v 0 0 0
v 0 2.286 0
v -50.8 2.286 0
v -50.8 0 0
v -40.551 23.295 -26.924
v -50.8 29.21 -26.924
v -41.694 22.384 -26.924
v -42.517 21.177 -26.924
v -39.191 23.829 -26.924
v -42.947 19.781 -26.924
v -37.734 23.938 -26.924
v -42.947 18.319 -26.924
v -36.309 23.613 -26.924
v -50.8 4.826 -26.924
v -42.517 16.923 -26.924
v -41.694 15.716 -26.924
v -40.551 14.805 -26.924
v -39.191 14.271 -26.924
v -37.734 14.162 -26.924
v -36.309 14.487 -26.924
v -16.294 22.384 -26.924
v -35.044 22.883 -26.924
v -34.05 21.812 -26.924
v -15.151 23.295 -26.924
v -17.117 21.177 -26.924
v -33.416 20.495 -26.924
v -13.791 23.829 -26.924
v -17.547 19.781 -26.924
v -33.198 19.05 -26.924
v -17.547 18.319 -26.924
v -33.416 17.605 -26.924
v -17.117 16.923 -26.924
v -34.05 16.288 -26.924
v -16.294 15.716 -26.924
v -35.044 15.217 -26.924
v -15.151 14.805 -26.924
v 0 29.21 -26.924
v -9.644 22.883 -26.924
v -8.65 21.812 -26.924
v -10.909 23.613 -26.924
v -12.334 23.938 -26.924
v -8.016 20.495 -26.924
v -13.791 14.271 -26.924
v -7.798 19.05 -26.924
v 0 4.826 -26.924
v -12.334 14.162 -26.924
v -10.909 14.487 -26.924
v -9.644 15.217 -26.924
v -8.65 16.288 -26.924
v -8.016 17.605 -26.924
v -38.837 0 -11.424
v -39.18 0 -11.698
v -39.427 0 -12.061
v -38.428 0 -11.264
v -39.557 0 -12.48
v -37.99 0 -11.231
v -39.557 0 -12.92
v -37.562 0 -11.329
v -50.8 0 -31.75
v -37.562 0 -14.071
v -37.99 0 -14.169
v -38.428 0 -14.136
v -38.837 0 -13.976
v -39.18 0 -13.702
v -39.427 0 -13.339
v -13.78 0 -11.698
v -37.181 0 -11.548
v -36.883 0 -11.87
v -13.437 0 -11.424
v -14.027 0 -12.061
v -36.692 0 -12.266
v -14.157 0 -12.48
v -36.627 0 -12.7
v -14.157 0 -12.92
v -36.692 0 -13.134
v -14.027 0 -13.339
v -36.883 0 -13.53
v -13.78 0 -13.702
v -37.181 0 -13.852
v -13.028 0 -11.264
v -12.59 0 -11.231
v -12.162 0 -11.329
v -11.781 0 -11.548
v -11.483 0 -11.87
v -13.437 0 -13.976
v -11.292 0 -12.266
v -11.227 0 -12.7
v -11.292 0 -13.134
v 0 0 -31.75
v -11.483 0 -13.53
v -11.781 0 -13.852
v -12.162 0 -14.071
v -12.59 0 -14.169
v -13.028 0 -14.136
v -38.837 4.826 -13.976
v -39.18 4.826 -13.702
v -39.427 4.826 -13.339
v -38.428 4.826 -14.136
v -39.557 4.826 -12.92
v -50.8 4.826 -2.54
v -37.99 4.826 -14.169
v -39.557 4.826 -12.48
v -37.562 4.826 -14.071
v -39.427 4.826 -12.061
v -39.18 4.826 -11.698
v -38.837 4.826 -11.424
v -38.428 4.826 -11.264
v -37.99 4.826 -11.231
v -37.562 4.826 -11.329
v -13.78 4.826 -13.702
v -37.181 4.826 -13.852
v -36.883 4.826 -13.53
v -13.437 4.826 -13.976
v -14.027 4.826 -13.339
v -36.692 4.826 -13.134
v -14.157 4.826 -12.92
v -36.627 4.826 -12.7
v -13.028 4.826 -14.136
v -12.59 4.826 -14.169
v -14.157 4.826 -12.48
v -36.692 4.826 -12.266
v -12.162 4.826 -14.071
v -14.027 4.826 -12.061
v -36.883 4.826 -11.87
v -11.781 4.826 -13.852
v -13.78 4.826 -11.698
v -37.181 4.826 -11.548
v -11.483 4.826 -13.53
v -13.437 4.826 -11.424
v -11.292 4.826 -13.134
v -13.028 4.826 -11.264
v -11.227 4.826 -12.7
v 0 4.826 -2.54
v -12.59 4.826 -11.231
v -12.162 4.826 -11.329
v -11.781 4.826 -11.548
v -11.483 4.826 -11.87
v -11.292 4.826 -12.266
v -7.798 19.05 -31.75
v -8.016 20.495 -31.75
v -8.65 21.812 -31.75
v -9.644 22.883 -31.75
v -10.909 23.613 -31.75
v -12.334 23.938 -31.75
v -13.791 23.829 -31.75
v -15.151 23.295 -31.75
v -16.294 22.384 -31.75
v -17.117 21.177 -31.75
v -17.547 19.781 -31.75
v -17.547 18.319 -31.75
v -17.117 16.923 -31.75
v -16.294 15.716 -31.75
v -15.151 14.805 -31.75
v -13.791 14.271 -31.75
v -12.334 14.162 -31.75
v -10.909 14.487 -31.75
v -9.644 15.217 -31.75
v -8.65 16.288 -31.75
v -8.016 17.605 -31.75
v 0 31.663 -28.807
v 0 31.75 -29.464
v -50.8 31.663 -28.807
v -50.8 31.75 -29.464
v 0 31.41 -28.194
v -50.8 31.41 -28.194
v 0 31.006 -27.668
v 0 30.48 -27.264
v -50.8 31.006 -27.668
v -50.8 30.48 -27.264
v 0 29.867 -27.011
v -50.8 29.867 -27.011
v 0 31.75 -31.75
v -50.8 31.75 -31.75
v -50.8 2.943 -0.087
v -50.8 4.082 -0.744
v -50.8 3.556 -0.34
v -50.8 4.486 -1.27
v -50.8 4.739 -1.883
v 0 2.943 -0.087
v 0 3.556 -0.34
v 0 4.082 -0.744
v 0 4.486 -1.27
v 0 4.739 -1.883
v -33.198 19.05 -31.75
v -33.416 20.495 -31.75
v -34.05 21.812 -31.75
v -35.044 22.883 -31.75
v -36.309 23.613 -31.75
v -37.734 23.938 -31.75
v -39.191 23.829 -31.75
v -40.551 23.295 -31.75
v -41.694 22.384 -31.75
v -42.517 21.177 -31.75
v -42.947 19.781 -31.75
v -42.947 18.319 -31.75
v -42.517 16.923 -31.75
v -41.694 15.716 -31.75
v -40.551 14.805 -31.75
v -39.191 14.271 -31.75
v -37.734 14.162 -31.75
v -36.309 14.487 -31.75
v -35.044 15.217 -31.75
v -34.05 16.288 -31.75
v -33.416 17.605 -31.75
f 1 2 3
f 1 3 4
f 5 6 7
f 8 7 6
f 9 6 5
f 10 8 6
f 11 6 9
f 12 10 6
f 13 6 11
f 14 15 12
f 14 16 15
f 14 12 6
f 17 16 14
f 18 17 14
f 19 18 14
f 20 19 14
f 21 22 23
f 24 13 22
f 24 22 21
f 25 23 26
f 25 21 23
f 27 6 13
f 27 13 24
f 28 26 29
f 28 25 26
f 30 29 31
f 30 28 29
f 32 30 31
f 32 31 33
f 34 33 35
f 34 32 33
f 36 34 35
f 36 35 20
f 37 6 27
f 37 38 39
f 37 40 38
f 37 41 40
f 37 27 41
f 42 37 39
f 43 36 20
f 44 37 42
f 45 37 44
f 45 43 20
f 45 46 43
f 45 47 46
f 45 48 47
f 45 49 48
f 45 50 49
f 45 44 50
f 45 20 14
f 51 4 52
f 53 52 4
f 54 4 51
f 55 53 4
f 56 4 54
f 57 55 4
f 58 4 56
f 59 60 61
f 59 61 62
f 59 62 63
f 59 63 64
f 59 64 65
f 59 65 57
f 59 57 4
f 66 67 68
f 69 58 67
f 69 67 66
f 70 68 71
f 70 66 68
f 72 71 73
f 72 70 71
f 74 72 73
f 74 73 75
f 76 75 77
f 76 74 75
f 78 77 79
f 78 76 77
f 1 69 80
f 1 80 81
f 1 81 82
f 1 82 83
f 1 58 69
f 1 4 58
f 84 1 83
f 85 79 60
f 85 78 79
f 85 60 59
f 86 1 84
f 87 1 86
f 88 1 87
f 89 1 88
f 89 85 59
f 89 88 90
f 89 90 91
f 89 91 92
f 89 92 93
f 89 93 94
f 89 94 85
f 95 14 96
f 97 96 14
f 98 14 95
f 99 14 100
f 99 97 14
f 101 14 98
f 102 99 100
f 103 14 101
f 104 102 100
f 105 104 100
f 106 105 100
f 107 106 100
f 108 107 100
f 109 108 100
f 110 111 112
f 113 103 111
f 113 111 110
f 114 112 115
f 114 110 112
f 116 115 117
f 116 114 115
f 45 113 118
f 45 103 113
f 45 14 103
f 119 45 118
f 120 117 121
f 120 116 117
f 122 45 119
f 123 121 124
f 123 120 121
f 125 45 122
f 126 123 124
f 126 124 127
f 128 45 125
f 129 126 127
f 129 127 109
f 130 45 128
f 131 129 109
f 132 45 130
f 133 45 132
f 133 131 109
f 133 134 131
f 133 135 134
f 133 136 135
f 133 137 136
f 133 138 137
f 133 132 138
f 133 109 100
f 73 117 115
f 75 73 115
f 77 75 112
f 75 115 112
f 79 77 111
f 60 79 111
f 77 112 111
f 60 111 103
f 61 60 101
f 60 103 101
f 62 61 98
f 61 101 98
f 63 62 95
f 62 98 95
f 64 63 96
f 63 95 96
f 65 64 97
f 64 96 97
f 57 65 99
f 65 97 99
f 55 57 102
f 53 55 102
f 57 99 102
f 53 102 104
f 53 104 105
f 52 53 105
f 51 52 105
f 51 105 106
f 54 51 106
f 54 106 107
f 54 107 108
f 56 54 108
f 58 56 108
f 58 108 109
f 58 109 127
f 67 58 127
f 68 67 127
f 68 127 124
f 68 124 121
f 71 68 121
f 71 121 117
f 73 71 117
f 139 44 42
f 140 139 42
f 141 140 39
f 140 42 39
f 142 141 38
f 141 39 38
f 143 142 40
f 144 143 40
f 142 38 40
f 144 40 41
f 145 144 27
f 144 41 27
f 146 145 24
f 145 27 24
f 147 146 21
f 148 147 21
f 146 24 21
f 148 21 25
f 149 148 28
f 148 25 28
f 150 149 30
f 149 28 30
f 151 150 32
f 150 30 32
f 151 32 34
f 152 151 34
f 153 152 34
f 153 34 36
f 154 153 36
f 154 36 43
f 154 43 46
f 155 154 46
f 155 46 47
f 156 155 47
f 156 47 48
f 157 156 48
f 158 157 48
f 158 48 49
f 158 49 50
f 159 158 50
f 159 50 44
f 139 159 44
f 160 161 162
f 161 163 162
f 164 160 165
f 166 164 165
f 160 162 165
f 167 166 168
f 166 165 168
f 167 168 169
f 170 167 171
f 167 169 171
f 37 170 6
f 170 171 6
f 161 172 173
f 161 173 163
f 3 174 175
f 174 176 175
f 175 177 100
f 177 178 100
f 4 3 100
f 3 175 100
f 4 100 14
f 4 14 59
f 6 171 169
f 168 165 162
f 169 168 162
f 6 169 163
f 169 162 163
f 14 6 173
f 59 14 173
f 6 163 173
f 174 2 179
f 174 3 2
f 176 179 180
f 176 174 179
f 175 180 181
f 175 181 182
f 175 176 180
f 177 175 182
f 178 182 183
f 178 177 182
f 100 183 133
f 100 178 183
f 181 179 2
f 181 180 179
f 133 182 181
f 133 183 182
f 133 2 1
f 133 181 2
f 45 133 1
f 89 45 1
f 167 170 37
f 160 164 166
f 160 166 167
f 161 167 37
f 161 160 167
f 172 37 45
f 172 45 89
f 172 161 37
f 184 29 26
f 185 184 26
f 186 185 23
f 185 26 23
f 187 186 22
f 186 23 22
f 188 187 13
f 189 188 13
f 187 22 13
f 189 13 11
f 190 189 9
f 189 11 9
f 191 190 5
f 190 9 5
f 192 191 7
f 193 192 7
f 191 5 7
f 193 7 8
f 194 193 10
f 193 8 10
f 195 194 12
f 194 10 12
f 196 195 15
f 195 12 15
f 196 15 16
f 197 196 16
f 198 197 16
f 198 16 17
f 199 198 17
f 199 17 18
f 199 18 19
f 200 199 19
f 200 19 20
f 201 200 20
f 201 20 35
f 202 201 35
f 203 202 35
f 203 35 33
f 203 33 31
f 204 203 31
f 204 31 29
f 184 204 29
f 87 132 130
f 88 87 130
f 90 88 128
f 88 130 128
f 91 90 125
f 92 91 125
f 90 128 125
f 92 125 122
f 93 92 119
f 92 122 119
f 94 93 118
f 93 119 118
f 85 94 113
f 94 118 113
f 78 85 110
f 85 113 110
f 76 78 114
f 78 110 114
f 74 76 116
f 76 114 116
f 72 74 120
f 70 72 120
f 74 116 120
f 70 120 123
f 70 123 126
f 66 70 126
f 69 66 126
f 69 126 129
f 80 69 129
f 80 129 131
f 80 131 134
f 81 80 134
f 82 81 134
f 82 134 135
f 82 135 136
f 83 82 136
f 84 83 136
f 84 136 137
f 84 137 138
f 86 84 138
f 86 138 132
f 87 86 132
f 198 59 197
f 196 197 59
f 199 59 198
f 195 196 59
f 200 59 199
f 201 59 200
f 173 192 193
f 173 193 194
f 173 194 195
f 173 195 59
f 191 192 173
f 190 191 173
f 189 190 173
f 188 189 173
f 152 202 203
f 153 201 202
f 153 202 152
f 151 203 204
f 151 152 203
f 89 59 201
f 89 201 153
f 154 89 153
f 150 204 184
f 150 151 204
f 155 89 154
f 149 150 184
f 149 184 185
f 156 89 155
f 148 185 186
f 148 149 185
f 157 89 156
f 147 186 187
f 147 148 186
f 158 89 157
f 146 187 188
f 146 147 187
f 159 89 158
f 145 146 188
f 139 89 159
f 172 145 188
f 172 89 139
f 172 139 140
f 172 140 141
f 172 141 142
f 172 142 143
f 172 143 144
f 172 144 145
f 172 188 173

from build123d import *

# Parameters (mm, degrees)
BOSS_EXTRUDE1_DEPTH = 50.8
SKETCH3_R           = 4.9022
CUT_EXTRUDE1_DEPTH  = 50.8
SKETCH4_R           = 1.4732
CUT_EXTRUDE2_DEPTH  = 50.8
FILLET1_R           = 2.54


with BuildPart() as part:
    # Sketch2 → Boss-Extrude1 (new body)
    with BuildSketch(Plane(origin=(0, 0, 0), x_dir=(0, 0, -1), z_dir=(1, 0, 0))):
        Polygon((0, 0), (31.75, 0), (31.75, 31.75), (26.924, 31.75), (26.924, 4.826), (0, 4.826), align=None)
    extrude(amount=-BOSS_EXTRUDE1_DEPTH)

    # Sketch3 → Cut-Extrude1 (cut)
    with BuildSketch(Plane.XY.offset(-26.924)):
        with Locations((-38.1, 19.05)):
            Circle(SKETCH3_R)
        with Locations((-12.7, 19.05)):
            Circle(SKETCH3_R)
    extrude(amount=-CUT_EXTRUDE1_DEPTH, mode=Mode.SUBTRACT)

    # Sketch4 → Cut-Extrude2 (cut)
    with BuildSketch(Plane(origin=(0, 4.826, 0), x_dir=(1, 0, 0), z_dir=(0, 1, 0))):
        with Locations((-38.1, 12.7)):
            Circle(SKETCH4_R)
        with Locations((-12.7, 12.7)):
            Circle(SKETCH4_R)
    extrude(amount=-CUT_EXTRUDE2_DEPTH, mode=Mode.SUBTRACT)

    # Fillet1
    fillet1_edges = [part.edges().sort_by_distance(p)[0] for p in [
        (-25.4, 4.826, 0),
        (-25.4, 31.75, -26.924),
    ]]
    fillet(fillet1_edges, radius=FILLET1_R)


solid = part.part
